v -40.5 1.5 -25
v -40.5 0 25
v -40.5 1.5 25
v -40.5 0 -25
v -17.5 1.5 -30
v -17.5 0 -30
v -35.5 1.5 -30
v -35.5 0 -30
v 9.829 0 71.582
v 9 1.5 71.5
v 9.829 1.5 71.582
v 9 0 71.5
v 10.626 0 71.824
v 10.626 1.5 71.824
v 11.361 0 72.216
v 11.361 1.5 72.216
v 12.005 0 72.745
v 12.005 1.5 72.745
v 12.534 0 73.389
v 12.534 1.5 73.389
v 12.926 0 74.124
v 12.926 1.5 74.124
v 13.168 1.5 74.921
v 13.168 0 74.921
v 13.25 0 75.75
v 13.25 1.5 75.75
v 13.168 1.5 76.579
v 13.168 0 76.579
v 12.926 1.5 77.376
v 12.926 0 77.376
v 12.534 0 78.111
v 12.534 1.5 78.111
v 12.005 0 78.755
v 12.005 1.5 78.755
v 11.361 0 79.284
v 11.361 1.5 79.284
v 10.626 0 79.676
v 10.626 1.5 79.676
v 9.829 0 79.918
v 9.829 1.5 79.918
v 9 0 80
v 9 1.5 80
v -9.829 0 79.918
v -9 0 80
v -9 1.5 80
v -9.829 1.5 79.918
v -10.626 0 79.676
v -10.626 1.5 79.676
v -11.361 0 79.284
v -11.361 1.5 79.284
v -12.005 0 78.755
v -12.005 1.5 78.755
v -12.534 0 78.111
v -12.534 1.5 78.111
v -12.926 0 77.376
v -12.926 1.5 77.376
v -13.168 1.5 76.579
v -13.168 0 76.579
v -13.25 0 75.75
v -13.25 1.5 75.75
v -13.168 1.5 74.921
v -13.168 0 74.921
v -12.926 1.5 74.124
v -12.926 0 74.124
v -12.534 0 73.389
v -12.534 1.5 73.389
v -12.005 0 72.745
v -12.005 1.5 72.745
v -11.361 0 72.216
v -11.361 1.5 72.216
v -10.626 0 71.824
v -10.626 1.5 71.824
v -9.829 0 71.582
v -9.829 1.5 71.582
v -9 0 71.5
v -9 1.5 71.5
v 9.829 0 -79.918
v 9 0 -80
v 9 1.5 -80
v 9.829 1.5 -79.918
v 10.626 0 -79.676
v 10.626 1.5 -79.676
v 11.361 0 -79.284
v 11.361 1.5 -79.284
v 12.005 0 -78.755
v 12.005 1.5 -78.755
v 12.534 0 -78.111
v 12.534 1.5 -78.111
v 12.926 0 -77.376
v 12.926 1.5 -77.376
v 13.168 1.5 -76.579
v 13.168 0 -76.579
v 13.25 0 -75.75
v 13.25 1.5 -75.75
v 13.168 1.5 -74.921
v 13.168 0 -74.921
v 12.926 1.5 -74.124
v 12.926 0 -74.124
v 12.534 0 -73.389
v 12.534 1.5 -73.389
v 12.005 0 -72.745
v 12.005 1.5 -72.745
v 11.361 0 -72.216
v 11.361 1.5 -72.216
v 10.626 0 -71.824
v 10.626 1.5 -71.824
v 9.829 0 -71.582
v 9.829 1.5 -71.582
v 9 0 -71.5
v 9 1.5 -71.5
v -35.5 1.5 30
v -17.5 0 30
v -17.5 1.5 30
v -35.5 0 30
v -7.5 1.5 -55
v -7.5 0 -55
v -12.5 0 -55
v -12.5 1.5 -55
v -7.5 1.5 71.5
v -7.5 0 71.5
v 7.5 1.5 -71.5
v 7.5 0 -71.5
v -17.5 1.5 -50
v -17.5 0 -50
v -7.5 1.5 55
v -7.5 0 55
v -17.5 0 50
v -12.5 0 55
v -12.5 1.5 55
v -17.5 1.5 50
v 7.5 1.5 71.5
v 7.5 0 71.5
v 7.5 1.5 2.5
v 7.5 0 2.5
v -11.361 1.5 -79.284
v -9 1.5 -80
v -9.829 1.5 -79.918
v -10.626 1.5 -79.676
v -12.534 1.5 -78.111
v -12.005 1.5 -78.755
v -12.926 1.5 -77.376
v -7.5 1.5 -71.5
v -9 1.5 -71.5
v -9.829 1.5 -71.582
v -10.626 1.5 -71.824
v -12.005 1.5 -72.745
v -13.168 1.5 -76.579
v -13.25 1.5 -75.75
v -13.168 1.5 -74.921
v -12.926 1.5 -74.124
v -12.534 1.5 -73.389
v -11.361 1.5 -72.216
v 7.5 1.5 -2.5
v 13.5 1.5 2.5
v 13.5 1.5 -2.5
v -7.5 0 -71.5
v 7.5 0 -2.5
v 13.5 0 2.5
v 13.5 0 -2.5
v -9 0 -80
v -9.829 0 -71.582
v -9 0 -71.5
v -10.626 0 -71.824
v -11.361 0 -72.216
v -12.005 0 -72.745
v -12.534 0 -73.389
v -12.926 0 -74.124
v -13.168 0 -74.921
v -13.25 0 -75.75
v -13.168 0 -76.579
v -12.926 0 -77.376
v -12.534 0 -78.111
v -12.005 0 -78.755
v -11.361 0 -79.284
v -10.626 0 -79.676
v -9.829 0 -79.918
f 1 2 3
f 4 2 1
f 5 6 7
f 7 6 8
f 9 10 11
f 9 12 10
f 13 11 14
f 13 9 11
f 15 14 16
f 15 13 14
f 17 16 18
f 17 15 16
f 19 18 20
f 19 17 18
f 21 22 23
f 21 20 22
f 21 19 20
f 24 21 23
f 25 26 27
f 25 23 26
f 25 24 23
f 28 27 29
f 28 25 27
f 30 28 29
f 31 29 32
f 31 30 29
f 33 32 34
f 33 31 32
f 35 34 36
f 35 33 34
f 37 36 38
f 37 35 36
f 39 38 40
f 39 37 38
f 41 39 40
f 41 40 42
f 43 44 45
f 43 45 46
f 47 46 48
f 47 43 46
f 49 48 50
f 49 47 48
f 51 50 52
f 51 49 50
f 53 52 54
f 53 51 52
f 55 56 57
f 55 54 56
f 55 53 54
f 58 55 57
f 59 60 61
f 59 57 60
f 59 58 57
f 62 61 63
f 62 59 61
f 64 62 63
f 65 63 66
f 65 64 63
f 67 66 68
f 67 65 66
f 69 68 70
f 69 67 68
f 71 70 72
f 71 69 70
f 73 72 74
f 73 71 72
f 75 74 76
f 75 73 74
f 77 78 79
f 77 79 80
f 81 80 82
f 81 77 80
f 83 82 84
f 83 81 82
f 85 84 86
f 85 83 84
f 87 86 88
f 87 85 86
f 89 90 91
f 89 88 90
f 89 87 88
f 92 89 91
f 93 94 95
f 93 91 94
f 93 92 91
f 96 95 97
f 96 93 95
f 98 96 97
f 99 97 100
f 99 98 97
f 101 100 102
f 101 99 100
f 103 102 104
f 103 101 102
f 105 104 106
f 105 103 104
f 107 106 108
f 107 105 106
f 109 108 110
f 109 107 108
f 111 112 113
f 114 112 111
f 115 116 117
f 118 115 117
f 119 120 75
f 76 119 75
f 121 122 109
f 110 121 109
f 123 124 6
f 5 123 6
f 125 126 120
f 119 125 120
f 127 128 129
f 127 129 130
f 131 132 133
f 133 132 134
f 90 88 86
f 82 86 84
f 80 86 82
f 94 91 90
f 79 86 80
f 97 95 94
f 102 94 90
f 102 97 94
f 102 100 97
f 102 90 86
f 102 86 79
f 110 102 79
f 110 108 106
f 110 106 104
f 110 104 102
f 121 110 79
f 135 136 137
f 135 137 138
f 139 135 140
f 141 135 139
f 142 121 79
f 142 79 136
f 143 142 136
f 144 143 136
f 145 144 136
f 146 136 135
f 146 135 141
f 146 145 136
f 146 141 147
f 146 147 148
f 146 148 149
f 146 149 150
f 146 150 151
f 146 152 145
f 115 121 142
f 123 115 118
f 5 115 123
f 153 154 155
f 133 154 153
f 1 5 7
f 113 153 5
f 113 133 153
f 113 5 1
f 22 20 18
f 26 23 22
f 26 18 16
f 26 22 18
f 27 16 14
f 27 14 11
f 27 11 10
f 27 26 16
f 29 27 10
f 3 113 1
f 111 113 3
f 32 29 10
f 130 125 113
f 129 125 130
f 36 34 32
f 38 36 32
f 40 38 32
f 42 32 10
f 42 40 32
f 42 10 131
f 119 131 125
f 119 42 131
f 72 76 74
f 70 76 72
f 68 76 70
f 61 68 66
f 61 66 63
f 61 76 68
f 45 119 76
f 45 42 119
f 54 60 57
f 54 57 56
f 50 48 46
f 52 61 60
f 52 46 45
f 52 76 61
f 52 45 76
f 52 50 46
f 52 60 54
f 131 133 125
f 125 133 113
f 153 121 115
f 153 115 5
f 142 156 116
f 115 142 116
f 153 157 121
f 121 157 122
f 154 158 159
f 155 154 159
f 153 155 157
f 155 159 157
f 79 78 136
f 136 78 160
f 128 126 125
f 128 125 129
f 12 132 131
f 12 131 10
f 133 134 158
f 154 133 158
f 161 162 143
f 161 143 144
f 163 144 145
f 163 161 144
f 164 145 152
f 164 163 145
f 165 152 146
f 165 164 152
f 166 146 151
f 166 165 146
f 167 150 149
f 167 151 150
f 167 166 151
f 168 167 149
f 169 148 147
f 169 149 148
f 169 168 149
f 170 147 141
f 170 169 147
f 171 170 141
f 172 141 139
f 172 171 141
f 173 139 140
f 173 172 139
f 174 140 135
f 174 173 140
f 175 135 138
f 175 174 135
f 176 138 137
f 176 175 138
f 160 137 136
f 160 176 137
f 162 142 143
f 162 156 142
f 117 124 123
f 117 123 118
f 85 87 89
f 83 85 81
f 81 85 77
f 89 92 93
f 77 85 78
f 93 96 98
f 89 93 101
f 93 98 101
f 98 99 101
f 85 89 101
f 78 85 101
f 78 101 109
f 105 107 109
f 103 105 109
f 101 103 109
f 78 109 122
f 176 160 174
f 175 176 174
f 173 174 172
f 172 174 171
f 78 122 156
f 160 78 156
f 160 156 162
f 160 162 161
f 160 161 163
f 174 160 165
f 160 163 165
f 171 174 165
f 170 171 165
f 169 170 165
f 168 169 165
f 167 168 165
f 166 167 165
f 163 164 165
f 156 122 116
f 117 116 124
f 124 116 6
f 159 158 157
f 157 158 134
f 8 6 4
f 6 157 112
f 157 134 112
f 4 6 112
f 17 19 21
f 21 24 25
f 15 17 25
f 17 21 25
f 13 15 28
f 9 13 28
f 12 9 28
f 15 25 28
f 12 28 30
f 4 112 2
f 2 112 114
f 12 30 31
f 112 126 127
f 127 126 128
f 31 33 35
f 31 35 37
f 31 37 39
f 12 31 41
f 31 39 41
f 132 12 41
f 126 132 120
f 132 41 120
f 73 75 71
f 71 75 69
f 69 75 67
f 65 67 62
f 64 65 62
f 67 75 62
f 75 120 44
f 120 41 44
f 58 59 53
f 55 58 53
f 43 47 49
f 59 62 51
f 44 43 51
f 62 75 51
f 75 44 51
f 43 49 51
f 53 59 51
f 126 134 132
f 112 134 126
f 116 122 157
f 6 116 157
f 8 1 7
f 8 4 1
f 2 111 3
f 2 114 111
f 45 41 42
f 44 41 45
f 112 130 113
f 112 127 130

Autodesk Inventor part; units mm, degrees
ref_plane "YZ Plane" through (0, 0, 0) normal (1, 0, 0) x (0, 1, 0)
ref_plane "XZ Plane" through (0, 0, 0) normal (0, 1, 0) x (-1, 0, 0)
ref_plane "XY Plane" through (0, 0, 0) normal (0, 0, 1) x (1, 0, 0)
sketch "Sketch1" plane through (0, 0, 0) normal (0, 1, 0) x (-1, 0, 0)
  line L0 (7.5, 80) -> (-7.5, 80)
  line L1 (-7.5, -80) -> (7.5, -80)
  line L2 (7.5, 75.75) -> (7.85, 75.75)
  line L3 (7.5, 80) -> (9, 80)
  line L4 (7.5, 71.5) -> (9, 71.5)
  arc A0 (9, 71.5) -> (9, 80) centre (9, 75.75) ccw
  line L5 (7.5, 74.6) -> (9, 74.6)
  line L6 (7.5, 76.9) -> (9, 76.9)
  arc A1 (9, 74.6) -> (9, 76.9) centre (9, 75.75) ccw
  line L7 (7.5, 0) -> (-7.5, 0) construction
  line L8 (-7.5, 80) -> (-9, 80)
  line L9 (-7.5, 71.5) -> (-9, 71.5)
  arc A2 (-9, 80) -> (-9, 71.5) centre (-9, 75.75) ccw
  line L10 (-7.5, 74.6) -> (-9, 74.6)
  line L11 (-7.5, 76.9) -> (-9, 76.9)
  arc A3 (-9, 76.9) -> (-9, 74.6) centre (-9, 75.75) ccw
  line L12 (7.5, -80) -> (9, -80)
  line L13 (7.5, -71.5) -> (9, -71.5)
  arc A4 (9, -80) -> (9, -71.5) centre (9, -75.75) ccw
  line L14 (7.5, -74.6) -> (9, -74.6)
  line L15 (7.5, -76.9) -> (9, -76.9)
  arc A5 (9, -76.9) -> (9, -74.6) centre (9, -75.75) ccw
  arc A6 (-9, -71.5) -> (-9, -80) centre (-9, -75.75) ccw
  line L16 (-7.5, -71.5) -> (-9, -71.5)
  line L17 (-7.5, -74.6) -> (-9, -74.6)
  arc A7 (-9, -74.6) -> (-9, -76.9) centre (-9, -75.75) ccw
  line L18 (-7.5, -76.9) -> (-9, -76.9)
  line L19 (-7.5, -80) -> (-9, -80)
  line L20 (7.5, 55) -> (12.5, 55)
  line L21 (17.5, 50) -> (17.5, 30)
  line L22 (17.5, 30) -> (35.5, 30)
  line L23 (40.5, 25) -> (40.5, 0)
  line L24 (7.5, -55) -> (12.5, -55)
  line L25 (17.5, -50) -> (17.5, -30)
  line L26 (17.5, -30) -> (35.5, -30)
  line L27 (40.5, -25) -> (40.5, 0)
  line L28 (12.5, 55) -> (17.5, 50)
  line L29 (35.5, 30) -> (40.5, 25)
  line L30 (40.5, -25) -> (35.5, -30)
  line L31 (17.5, -50) -> (12.5, -55)
  circle A8 centre (33.5, 0) radius 1.025
  circle A9 centre (-11.5, 0) radius 1.025
  line L32 (-7.5, 2.5) -> (-13.5, 2.5)
  line L33 (-13.5, 2.5) -> (-13.5, -2.5)
  line L34 (-13.5, -2.5) -> (-7.5, -2.5)
  line L35 (7.5, -76.9) -> (7.5, -74.6)
  line L36 (7.5, -71.5) -> (7.5, -55)
  line L37 (-7.5, -2.5) -> (-7.5, -71.5)
  line L38 (-7.5, -74.6) -> (-7.5, -76.9)
  line L39 (7.5, 55) -> (7.5, 71.5)
  line L40 (7.5, 74.6) -> (7.5, 76.9)
  line L41 (-7.5, 76.9) -> (-7.5, 74.6)
  line L42 (-7.5, 71.5) -> (-7.5, 2.5)
  point P0 (0, 0)
  point P1 (0, 0)
  point P2 (8.25, 71.5)
  point P3 (17.5, 55)
  point P4 (40.5, 30)
  point P5 (17.5, -55)
  point P6 (40.5, -30)
  dimension "d0" = 160
  dimension "d2" = 1.5
  dimension "d3" = 4.25
  dimension "d5" = 4.25
  dimension "d6" = 4.25
  dimension "d7" = 1.15
  dimension "d8" = 1.15
  dimension "d9" = 1.15
  dimension "d10" = 10
  dimension "d11" = 25
  dimension "d12" = 23
  dimension "d13" = 25
  dimension "d14" = 25
  dimension "d15" = 5
  dimension "d16" = 5
  dimension "d17" = 5
  dimension "d18" = 5
  dimension "d19" = 5
  dimension "d20" = 5
  dimension "d21" = 5
  dimension "d22" = 5
  dimension "d24" = 2.05
  dimension "d25" = 7
  dimension "d26" = 2.05
extrude "Extrusion1" add sketch "Sketch1" along normal blind 1.5 contours L3 A0 L4 L39 L20 L28 L21 L22 L29 L23 L27 L30 L26 L25 L31 L24 L36 L13 A4 L12 L1 L19 A6 L16 L37 L34 L33 L32 L42 L9 A2 L8 L0 | L40 L6 A1 L5 | L10 A3 L11 L41 | L14 A5 L15 L35 | L38 L18 A7 L17 | A8 | A9
equation "\"d16\" = d15"
equation "\"d17\" = d15"
equation "\"d18\" = d17"
equation "\"d19\" = d15"
equation "\"d20\" = d19"
equation "\"d21\" = d15"
equation "\"d22\" = d21"
properties part number "linefollower_chassy_model_3"
